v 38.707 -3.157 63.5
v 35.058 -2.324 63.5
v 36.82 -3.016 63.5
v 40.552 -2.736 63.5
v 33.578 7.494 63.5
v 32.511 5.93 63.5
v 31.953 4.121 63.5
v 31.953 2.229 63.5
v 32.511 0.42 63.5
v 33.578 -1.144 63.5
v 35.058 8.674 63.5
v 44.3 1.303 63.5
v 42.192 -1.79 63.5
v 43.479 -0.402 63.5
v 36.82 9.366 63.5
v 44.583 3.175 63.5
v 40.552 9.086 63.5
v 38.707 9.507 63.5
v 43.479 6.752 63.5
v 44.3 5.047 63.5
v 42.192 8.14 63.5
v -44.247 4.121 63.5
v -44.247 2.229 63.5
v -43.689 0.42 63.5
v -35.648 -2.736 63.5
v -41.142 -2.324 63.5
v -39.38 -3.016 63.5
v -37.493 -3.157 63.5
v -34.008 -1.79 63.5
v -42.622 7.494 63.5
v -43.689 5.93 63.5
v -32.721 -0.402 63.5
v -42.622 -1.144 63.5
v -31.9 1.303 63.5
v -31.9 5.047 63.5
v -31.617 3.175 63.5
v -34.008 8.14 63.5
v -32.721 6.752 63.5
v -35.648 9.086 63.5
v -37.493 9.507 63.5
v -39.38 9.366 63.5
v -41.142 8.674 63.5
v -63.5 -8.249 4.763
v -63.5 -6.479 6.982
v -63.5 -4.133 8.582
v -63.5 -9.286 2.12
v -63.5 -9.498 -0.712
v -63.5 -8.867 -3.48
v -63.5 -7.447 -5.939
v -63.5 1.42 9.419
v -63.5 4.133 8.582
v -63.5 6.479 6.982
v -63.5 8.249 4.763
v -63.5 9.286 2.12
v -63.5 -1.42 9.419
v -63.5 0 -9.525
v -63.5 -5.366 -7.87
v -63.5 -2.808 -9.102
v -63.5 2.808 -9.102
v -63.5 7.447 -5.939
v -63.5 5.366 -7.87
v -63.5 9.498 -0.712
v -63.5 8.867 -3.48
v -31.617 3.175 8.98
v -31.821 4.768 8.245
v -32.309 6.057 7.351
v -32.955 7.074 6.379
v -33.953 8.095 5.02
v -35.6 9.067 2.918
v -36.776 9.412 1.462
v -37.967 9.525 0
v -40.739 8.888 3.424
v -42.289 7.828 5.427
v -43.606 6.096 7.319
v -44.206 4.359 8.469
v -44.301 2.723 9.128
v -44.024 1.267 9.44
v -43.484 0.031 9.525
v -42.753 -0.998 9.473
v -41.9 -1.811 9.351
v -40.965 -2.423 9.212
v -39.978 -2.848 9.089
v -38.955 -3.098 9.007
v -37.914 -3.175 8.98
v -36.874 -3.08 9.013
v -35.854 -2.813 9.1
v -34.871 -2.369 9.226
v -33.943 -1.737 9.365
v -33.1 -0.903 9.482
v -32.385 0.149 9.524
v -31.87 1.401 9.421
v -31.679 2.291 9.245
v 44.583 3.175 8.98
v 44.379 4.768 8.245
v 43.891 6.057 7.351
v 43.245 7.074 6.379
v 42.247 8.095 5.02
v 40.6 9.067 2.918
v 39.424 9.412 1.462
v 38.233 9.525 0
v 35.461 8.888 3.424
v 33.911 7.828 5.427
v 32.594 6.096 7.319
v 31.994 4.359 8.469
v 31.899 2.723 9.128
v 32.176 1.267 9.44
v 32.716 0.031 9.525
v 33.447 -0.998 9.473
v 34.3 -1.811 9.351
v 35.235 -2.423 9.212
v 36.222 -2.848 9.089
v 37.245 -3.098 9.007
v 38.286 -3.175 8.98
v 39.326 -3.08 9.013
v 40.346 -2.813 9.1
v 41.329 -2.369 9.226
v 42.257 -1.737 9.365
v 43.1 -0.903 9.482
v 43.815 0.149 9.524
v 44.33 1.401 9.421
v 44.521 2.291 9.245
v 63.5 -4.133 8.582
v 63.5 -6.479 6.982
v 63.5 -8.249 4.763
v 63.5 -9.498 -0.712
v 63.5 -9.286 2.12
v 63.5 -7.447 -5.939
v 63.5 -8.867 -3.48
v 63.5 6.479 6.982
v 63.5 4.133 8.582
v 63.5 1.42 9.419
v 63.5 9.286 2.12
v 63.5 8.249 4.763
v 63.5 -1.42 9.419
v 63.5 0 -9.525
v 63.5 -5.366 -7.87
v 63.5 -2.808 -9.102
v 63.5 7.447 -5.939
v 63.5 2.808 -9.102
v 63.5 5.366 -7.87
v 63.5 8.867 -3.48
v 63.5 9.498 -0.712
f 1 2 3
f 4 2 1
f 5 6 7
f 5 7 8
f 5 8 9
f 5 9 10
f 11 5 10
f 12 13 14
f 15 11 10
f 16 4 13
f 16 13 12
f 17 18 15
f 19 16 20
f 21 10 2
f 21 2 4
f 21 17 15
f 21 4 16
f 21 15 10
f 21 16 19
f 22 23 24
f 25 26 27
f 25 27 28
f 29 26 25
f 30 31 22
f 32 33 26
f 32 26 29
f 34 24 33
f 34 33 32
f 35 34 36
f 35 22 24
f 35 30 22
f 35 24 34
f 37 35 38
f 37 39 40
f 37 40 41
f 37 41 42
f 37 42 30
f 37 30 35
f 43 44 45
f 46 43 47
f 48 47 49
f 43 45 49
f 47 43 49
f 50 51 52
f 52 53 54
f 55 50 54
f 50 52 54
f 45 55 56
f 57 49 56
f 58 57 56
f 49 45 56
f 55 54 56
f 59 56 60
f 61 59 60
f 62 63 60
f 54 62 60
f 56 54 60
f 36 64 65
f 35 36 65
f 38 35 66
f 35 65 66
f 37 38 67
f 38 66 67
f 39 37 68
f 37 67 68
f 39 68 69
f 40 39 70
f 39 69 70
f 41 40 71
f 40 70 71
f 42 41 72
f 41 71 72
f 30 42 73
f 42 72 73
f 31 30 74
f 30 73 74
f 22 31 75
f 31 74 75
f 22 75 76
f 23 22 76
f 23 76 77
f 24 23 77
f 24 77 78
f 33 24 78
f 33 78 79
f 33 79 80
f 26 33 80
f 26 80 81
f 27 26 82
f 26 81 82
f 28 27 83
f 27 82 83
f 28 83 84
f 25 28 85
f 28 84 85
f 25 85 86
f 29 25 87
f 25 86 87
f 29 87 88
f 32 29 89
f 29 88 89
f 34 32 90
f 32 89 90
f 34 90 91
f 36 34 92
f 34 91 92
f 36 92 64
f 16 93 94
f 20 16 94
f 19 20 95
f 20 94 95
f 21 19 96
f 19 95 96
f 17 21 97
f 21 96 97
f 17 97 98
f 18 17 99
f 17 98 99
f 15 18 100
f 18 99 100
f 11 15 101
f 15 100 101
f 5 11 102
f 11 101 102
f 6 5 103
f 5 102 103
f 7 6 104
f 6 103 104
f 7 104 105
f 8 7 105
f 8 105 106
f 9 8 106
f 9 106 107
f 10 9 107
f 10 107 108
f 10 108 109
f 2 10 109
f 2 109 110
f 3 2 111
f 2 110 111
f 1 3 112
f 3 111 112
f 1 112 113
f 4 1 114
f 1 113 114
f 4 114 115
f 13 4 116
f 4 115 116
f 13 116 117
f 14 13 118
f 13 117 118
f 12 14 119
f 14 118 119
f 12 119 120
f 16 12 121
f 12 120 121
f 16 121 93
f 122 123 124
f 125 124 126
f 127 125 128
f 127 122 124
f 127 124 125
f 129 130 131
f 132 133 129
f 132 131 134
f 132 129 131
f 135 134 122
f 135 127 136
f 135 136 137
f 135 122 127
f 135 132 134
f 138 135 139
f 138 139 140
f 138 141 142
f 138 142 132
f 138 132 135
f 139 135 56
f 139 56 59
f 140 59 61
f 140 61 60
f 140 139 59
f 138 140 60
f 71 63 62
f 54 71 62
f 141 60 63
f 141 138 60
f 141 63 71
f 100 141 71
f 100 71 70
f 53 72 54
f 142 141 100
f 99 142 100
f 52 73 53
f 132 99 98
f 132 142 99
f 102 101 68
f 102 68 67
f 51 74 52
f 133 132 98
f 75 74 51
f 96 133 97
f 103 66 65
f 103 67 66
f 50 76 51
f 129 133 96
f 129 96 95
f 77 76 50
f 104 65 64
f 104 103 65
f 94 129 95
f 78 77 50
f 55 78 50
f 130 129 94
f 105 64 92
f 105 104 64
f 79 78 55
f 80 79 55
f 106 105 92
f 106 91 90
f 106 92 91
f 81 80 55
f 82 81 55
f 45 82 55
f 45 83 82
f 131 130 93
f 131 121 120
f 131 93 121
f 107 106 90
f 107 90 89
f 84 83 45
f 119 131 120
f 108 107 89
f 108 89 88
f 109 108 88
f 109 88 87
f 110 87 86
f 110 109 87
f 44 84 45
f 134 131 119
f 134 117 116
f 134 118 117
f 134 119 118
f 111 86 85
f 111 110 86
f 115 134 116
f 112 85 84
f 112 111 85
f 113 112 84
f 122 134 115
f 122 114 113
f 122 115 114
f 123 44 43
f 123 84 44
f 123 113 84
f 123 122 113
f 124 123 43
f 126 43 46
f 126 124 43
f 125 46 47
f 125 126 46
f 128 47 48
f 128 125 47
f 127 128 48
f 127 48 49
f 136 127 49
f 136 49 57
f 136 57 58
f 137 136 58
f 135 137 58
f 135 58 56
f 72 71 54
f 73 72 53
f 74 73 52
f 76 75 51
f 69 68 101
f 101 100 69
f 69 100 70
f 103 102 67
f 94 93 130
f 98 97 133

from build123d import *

# Parameters (mm, degrees)
SKETCH3_R           = 9.525
BOSS_EXTRUDE1_DEPTH = 63.5
SKETCH4_R           = 6.35
BOSS_EXTRUDE2_DEPTH = 63.5


with BuildPart() as part:
    # Sketch3 → Boss-Extrude1 (new body, symmetric)
    with BuildSketch(Plane(origin=(0, 0, 0), x_dir=(0, 0, -1), z_dir=(1, 0, 0))):
        Circle(SKETCH3_R)
    extrude(amount=BOSS_EXTRUDE1_DEPTH, both=True)

    # Sketch4 → Boss-Extrude2 (add)
    with BuildSketch(Plane.XY):
        with Locations((-37.967477859, 3.175)):
            Circle(SKETCH4_R)
        with Locations((38.232522141, 3.175)):
            Circle(SKETCH4_R)
    extrude(amount=BOSS_EXTRUDE2_DEPTH)


solid = part.part
